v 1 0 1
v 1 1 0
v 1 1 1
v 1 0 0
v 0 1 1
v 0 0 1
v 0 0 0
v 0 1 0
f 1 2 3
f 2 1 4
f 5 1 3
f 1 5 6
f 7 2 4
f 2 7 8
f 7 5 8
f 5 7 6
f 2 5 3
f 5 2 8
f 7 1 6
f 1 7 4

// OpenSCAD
module c() children();
c();
c() cube();
module a() children();
a() a() cube();
